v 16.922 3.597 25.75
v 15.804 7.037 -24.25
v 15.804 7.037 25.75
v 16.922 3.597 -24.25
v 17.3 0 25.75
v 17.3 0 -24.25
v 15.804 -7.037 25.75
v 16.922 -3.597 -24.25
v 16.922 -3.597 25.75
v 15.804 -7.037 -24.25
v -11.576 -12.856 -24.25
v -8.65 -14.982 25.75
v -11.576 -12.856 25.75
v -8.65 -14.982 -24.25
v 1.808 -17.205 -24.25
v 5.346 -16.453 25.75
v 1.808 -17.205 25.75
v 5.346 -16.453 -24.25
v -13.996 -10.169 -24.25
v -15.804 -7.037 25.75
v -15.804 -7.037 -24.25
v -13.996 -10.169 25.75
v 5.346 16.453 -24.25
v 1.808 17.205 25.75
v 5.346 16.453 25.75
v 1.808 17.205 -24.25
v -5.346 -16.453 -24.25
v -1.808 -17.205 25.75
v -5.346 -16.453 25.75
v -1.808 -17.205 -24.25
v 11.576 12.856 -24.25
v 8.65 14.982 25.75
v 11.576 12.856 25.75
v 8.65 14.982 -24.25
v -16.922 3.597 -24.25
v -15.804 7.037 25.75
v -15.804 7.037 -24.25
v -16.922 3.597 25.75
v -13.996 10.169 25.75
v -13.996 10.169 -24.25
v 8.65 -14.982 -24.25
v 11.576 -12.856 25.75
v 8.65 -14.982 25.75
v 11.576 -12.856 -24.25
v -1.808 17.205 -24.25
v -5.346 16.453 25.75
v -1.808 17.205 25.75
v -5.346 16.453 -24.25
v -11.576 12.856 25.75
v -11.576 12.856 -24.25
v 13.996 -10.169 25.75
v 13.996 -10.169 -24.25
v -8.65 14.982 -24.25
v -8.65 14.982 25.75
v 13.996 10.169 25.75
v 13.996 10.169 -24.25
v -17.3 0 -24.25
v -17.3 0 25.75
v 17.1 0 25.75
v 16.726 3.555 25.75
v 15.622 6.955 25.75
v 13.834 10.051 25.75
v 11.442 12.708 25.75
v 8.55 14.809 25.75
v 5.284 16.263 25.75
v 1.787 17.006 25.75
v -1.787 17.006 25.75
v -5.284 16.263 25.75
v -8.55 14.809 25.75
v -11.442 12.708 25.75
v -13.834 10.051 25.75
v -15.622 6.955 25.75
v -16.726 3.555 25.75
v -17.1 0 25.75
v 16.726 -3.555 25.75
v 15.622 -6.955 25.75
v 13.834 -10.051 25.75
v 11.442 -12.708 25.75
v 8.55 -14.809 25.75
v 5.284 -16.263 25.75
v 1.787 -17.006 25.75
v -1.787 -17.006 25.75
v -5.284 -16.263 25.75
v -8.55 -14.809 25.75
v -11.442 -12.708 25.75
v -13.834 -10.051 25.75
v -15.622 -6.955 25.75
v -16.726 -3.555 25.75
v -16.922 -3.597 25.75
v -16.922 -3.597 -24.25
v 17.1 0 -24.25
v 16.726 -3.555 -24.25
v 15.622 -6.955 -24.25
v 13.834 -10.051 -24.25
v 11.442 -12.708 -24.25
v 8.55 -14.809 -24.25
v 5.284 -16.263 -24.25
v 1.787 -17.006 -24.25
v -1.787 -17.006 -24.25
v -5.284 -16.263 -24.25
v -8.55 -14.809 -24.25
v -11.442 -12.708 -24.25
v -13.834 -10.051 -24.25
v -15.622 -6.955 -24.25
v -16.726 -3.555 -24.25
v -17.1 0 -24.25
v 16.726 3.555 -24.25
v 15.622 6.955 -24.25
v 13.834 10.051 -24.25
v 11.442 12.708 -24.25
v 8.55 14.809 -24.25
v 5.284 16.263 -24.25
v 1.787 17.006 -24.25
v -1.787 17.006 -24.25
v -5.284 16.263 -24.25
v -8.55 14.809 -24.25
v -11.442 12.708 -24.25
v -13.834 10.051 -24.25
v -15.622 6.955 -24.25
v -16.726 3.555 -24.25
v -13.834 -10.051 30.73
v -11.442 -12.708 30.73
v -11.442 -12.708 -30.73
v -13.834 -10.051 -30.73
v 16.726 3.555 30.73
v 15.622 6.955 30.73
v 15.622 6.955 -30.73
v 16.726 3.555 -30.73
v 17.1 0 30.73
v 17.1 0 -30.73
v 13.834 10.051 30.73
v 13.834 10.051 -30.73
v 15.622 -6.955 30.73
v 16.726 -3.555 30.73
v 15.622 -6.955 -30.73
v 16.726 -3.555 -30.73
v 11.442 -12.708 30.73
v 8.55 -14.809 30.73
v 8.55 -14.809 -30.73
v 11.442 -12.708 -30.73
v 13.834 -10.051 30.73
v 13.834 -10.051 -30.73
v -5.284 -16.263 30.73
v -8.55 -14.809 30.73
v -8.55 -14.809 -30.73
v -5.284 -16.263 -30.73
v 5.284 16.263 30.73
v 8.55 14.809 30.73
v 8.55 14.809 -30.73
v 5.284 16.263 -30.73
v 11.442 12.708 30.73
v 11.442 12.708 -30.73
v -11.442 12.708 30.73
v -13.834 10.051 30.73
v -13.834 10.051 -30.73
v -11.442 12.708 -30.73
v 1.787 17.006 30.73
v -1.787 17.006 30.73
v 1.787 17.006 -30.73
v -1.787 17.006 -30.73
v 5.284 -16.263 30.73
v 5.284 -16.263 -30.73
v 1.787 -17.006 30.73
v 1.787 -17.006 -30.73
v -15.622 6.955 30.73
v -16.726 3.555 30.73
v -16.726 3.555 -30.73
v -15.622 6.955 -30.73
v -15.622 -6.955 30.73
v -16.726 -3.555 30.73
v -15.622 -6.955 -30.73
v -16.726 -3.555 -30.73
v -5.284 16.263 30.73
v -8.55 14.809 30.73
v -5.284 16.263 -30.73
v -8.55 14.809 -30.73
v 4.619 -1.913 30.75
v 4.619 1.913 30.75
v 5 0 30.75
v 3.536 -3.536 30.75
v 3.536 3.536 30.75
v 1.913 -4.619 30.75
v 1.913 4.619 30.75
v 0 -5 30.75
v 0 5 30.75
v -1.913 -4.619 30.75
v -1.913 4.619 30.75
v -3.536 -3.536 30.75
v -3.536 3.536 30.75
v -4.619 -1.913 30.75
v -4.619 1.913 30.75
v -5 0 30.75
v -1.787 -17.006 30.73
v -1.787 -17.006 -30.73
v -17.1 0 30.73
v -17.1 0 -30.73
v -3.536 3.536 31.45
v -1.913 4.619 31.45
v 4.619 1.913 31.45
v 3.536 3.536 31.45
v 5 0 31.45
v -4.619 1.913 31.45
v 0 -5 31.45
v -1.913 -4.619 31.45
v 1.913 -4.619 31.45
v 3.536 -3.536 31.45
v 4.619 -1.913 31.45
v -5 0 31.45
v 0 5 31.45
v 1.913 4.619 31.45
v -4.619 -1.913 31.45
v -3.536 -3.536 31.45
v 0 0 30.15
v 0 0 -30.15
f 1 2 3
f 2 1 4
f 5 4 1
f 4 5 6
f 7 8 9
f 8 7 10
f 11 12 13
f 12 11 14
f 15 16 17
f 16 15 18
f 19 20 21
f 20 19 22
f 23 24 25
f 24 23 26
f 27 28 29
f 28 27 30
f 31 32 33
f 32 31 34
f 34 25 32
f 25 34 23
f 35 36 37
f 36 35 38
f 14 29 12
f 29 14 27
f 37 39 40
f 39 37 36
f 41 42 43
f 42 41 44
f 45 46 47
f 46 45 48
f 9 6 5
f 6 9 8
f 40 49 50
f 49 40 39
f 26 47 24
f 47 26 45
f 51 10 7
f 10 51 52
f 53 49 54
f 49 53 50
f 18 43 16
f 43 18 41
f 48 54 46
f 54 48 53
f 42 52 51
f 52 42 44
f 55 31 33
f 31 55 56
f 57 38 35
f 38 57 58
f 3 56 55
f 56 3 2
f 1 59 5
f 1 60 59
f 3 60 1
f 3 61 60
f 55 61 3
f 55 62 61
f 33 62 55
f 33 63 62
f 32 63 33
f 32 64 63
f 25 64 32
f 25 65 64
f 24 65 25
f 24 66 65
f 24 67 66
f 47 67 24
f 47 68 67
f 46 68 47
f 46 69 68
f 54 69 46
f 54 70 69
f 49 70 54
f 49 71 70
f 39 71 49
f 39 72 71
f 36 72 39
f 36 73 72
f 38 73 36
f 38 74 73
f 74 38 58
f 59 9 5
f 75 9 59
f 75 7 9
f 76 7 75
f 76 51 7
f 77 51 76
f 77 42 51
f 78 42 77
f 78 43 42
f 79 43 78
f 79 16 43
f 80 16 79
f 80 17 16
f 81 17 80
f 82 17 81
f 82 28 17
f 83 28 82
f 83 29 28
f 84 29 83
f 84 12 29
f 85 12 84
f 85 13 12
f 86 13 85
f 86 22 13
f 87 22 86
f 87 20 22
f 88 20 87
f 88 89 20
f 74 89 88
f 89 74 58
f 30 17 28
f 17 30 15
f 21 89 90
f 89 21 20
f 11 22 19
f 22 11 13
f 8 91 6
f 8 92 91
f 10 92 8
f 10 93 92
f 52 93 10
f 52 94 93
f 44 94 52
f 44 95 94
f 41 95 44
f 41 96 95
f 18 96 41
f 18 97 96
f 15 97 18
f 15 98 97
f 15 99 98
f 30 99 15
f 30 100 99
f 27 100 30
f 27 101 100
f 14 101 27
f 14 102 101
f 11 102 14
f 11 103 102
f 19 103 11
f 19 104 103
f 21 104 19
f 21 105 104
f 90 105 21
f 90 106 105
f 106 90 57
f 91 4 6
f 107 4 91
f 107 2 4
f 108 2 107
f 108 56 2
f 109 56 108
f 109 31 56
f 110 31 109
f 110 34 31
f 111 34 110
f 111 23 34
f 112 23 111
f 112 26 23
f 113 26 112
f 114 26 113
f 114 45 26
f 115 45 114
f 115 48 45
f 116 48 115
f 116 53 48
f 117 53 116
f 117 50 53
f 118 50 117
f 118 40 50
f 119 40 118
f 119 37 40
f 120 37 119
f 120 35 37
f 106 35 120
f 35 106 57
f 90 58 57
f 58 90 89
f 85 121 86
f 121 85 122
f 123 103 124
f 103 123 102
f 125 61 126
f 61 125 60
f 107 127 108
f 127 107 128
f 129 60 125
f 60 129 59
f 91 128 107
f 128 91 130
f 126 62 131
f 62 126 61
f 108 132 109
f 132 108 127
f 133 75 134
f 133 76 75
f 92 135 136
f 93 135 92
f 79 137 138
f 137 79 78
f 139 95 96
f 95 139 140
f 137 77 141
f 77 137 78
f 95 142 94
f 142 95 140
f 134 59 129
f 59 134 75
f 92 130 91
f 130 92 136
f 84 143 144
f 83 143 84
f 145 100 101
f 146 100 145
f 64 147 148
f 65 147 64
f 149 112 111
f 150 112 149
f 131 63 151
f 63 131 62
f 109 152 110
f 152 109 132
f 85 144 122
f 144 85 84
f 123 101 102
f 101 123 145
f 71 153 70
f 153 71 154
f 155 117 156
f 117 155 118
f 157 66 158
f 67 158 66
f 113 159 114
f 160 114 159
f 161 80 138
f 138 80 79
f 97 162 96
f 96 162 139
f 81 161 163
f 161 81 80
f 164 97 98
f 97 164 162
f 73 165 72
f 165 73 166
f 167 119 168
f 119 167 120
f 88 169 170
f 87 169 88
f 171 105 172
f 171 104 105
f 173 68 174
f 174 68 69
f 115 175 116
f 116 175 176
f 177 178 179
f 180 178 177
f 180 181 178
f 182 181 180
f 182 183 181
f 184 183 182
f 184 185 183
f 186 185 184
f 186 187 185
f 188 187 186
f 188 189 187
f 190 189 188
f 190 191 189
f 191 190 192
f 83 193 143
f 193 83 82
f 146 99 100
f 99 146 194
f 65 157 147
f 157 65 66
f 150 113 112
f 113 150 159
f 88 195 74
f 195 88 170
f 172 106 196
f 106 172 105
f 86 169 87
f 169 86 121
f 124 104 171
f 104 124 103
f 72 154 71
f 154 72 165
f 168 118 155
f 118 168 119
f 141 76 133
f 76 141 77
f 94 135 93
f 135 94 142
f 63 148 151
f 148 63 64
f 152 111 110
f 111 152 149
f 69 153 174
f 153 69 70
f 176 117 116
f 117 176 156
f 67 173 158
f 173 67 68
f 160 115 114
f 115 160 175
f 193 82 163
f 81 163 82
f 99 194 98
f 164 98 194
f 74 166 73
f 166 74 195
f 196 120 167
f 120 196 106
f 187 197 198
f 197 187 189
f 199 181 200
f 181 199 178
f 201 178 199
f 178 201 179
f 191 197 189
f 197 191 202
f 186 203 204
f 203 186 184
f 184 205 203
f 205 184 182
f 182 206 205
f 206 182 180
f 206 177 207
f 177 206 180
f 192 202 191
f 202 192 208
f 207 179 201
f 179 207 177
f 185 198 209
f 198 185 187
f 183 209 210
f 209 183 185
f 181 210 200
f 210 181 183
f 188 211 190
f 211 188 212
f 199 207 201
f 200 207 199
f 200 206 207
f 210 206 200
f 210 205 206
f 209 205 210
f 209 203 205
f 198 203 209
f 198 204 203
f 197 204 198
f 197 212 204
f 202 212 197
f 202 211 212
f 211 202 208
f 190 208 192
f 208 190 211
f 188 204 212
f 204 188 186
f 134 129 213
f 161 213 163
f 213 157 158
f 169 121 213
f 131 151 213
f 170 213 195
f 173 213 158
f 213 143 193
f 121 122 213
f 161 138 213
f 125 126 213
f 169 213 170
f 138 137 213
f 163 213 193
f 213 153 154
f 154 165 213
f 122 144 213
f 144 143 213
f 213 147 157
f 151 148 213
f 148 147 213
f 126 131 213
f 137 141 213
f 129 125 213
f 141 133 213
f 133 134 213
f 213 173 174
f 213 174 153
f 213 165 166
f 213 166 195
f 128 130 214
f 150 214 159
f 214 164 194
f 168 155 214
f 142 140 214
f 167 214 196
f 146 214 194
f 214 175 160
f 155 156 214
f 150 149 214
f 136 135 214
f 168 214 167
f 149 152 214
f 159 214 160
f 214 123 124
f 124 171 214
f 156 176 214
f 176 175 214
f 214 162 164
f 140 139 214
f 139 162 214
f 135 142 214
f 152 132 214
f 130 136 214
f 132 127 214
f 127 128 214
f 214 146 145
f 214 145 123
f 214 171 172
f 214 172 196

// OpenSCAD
// Parameters
cell_H = 61.5; //[30.75:123:0.1]
cell_D = 34.2; //[17.1:68.4:0.1]
terminal_D = 10; //[5:20:0.1]
terminal_H = 1.5; //[0.75:3:0.1]
bottom_contact_recess_D = 12; //[6:24:0.1]
bottom_contact_recess_depth = 0.3; //[0.15:0.6:0.05]
insulator_ring_OD = 16; //[8:32:0.1]
insulator_ring_ID = 11; //[5.5:22:0.1]
insulator_ring_H = 0.6; //[0.3:1.2:0.05]
label_thickness = 0.2; //[0.1:0.6:0.05]
label_H = 50; //[25:100:0.5]
label_top_margin = 5; //[2.5:10:0.5]
edge_chamfer = 0.6; //[0.3:1.2:0.05]
connect_overlap = 0.8; //[0.5:2:0.1]

// Base Shapes
module cell_body() {
  color("Silver")
  cylinder(h=cell_H, r=cell_D/2, center=true);
}

module top_positive_terminal() {
  color("DimGray")
  translate([0, 0, cell_H/2 + terminal_H/2 - connect_overlap])
  cylinder(h=terminal_H, r=terminal_D/2, center=true);
}

module bottom_negative_contact() {
  translate([0, 0, -cell_H/2 + bottom_contact_recess_depth/2])
  cylinder(h=bottom_contact_recess_depth, r=bottom_contact_recess_D/2, center=true);
}

module top_insulator_ring() {
  difference() {
    color("White")
    translate([0, 0, cell_H/2 + insulator_ring_H/2 - connect_overlap])
    cylinder(h=insulator_ring_H, r=insulator_ring_OD/2, center=true);
    translate([0, 0, cell_H/2 + insulator_ring_H/2 - connect_overlap])
    cylinder(h=insulator_ring_H + 2*connect_overlap, r=insulator_ring_ID/2, center=true);
  }
}

module label_wrap() {
  difference() {
    color("Blue")
    translate([0, 0, cell_H/2 - label_top_margin - label_H/2])
    cylinder(h=label_H, r=cell_D/2 + label_thickness, center=true);
    translate([0, 0, cell_H/2 - label_top_margin - label_H/2])
    cylinder(h=label_H + 2*connect_overlap, r=cell_D/2 - connect_overlap, center=true);
  }
}

module edge_chamfer_top_cone() {
  translate([0, 0, cell_H/2 - edge_chamfer/2])
  rotate([180, 0, 0])
  cylinder(h=edge_chamfer, r1=cell_D/2 + edge_chamfer, r2=0, center=true);
}

module edge_chamfer_bottom_cone() {
  translate([0, 0, -cell_H/2 + edge_chamfer/2])
  cylinder(h=edge_chamfer, r1=cell_D/2 + edge_chamfer, r2=0, center=true);
}

// Operations
module battery_complete() {
  difference() {
    union() {
      cell_body();
      top_positive_terminal();
      top_insulator_ring();
      label_wrap();
    }
    edge_chamfer_top_cone();
    edge_chamfer_bottom_cone();
    bottom_negative_contact();
  }
}

// Final Output
battery_complete();
